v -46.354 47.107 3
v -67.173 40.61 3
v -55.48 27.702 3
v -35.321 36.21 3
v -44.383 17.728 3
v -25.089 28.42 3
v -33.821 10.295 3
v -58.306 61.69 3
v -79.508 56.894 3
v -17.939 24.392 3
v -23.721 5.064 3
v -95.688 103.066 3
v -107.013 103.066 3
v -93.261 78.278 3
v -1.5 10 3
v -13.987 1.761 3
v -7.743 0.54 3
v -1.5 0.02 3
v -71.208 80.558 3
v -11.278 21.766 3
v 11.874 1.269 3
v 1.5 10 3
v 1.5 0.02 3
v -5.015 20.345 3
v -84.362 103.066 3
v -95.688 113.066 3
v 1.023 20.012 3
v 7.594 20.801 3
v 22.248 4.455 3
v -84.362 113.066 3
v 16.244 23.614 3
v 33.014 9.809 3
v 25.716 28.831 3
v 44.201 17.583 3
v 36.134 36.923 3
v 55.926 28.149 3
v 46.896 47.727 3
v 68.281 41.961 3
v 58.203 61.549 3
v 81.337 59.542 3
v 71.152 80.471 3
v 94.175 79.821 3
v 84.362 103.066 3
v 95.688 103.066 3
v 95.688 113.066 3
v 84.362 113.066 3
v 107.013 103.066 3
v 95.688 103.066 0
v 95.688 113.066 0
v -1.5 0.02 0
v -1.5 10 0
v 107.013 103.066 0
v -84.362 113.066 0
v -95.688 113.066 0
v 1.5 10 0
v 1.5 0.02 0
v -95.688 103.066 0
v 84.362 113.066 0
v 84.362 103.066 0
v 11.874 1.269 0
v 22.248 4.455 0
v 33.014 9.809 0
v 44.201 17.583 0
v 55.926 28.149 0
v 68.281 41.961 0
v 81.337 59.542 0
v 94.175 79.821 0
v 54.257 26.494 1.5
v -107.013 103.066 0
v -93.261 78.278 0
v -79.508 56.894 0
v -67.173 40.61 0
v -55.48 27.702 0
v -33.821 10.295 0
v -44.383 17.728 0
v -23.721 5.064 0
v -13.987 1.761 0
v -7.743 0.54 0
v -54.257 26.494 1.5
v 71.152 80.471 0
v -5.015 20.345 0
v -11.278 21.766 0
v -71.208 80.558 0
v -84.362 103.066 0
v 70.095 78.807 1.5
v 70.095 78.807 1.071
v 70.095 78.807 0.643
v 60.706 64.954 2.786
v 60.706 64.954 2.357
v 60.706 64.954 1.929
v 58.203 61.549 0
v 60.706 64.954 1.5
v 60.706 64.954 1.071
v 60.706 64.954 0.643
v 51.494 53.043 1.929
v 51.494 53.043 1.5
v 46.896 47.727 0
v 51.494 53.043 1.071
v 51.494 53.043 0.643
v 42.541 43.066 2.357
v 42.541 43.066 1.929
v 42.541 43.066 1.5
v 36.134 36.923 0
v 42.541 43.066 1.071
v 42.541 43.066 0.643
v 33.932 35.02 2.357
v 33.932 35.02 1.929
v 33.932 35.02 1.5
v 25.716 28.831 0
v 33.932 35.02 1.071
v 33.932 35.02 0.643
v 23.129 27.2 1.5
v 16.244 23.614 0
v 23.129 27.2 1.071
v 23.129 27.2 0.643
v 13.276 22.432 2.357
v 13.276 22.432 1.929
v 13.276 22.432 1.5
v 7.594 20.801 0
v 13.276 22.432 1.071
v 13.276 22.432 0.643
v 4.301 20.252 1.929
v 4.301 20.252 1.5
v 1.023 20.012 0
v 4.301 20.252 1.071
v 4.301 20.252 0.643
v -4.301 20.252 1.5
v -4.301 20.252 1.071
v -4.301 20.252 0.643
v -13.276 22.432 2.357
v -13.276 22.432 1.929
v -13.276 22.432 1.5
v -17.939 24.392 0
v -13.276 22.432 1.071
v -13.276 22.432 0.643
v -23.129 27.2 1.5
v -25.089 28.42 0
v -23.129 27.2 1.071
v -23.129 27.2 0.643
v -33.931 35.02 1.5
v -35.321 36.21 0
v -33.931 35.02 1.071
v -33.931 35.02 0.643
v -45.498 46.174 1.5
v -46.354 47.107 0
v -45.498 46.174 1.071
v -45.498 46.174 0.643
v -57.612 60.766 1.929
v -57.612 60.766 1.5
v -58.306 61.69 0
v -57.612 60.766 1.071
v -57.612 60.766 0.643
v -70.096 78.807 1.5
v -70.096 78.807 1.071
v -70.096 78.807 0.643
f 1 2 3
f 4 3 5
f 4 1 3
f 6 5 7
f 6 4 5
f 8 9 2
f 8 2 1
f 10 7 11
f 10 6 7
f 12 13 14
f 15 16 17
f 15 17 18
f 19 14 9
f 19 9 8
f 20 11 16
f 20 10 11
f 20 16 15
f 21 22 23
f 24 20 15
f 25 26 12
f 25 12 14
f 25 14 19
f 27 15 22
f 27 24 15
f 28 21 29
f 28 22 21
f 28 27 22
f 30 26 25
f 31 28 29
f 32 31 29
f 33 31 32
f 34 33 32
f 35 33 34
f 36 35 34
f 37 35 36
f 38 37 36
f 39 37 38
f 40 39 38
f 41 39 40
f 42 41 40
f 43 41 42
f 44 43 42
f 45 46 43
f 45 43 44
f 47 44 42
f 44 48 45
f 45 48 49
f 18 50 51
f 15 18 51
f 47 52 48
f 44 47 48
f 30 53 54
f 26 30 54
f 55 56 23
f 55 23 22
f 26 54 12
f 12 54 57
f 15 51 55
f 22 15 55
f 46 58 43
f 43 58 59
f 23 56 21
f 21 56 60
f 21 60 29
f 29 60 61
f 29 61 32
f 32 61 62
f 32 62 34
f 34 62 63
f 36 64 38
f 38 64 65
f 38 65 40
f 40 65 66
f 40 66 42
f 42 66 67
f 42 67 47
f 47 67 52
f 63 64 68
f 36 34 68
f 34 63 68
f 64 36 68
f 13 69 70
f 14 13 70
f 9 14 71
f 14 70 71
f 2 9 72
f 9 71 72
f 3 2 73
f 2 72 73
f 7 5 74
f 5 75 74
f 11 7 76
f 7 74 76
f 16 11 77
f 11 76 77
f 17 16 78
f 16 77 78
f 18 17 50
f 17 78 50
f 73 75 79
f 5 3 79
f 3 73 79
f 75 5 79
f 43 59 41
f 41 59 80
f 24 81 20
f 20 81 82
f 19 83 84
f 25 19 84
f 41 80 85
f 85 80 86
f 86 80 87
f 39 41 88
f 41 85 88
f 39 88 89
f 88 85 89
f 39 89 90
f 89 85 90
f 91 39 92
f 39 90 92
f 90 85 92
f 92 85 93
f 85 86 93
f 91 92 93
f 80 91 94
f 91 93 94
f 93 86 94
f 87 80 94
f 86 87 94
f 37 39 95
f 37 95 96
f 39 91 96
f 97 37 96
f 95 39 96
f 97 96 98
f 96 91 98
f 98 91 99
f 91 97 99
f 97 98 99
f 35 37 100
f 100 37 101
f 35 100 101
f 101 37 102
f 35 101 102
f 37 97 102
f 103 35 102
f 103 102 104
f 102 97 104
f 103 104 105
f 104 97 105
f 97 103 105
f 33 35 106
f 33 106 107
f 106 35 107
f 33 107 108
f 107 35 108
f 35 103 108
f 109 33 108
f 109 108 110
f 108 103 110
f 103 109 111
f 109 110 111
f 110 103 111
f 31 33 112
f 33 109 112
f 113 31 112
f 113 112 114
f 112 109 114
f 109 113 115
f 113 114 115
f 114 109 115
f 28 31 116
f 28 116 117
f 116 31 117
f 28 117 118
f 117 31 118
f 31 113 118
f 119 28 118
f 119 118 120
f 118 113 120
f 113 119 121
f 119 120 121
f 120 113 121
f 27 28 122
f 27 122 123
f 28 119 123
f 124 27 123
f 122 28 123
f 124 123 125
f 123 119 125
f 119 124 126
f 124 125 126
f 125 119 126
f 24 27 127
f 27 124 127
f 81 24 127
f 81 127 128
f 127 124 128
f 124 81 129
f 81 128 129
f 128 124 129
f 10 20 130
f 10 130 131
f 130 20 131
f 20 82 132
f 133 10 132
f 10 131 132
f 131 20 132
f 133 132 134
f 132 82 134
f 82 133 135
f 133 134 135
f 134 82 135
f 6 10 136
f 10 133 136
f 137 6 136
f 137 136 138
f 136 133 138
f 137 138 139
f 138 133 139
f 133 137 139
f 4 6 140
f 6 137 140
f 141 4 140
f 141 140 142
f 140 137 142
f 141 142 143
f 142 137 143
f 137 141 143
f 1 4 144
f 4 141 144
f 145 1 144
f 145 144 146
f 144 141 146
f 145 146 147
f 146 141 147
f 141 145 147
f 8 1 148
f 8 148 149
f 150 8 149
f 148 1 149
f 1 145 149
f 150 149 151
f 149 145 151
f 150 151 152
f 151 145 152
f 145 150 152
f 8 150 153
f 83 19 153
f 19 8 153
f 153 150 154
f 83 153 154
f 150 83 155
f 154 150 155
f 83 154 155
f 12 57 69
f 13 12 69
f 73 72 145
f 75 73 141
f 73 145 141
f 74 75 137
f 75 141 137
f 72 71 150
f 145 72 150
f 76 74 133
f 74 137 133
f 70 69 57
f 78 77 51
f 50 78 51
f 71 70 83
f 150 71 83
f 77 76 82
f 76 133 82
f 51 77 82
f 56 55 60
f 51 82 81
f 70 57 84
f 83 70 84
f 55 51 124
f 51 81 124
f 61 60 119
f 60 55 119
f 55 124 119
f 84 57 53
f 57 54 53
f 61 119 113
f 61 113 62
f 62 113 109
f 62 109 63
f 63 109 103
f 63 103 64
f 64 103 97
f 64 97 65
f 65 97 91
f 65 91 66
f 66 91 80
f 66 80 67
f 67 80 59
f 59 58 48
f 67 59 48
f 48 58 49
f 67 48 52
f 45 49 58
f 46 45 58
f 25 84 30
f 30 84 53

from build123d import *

# Parameters (mm, degrees)
BOSS_EXTRUDE1_DEPTH = 3
SKETCH2_W           = 3
SKETCH2_H           = 11.487699198
CUT_EXTRUDE1_DEPTH  = 16


# Read off the part's stored shape, not the designer's step: Boss-Extrude1
with BuildPart() as part:
    # Boss-Extrude1 outline → Boss-Extrude1 (new body)
    with BuildSketch(Plane.XY):
        with BuildLine():
            Line((-95.687613819, 113.066263652), (-95.687613819, 103.066263652))
            Line((-95.687613819, 103.066263652), (-107.013116357, 103.066263652))
            add(Edge.make_bspline(
                [(-107.013116357, 103.066263652), (0, -103.066263652), (107.013116357, 103.066263652)],
                knots=[0.057157488, 0.057157488, 0.057157488, 0.942842512, 0.942842512, 0.942842512], degree=2))
            Line((107.013116357, 103.066263652), (95.68761382, 103.066263652))
            Line((95.68761382, 103.066263652), (95.68761382, 113.066263652))
            Line((95.68761382, 113.066263652), (84.362111282, 113.066263652))
            Line((84.362111282, 113.066263652), (84.362111282, 103.066263652))
            add(Edge.make_bspline(
                [(84.362111282, 103.066263652), (77.169203523, 89.870321464), (60.617973136, 63.983872026), (42.369102372, 42.101536817), (28.30806557, 30.298322138), (17.949926074, 24.101443082), (8.601675425, 20.762226356), (-2.4893e-05, 19.742494759), (-8.601757959, 20.762212203), (-17.949851697, 24.101471728), (-28.308921959, 30.298047433), (-39.552364136, 39.742329541), (-51.44403726, 52.605304358), (-63.778998477, 68.925840315), (-77.169000129, 89.870127882), (-84.362111282, 103.066263652)],
                knots=[0.078216729, 0.078216729, 0.078216729, 0.140190459, 0.22322343, 0.306256401, 0.361611715, 0.416967029, 0.472322343, 0.527677657, 0.583032971, 0.638388285, 0.693743599, 0.749098913, 0.804454227, 0.859809541, 0.921783758, 0.921783758, 0.921783758], degree=2))
            Line((-84.362111282, 103.066263652), (-84.362111282, 113.066263652))
            Line((-84.362111282, 113.066263652), (-95.687613819, 113.066263652))
        make_face()
    extrude(amount=BOSS_EXTRUDE1_DEPTH)

    # Sketch2 → Cut-Extrude1 (cut)
    with BuildSketch(Plane.XY):
        with Locations((0, 4.256150401)):
            Rectangle(SKETCH2_W, SKETCH2_H)
    extrude(amount=CUT_EXTRUDE1_DEPTH, mode=Mode.SUBTRACT)


solid = part.part
